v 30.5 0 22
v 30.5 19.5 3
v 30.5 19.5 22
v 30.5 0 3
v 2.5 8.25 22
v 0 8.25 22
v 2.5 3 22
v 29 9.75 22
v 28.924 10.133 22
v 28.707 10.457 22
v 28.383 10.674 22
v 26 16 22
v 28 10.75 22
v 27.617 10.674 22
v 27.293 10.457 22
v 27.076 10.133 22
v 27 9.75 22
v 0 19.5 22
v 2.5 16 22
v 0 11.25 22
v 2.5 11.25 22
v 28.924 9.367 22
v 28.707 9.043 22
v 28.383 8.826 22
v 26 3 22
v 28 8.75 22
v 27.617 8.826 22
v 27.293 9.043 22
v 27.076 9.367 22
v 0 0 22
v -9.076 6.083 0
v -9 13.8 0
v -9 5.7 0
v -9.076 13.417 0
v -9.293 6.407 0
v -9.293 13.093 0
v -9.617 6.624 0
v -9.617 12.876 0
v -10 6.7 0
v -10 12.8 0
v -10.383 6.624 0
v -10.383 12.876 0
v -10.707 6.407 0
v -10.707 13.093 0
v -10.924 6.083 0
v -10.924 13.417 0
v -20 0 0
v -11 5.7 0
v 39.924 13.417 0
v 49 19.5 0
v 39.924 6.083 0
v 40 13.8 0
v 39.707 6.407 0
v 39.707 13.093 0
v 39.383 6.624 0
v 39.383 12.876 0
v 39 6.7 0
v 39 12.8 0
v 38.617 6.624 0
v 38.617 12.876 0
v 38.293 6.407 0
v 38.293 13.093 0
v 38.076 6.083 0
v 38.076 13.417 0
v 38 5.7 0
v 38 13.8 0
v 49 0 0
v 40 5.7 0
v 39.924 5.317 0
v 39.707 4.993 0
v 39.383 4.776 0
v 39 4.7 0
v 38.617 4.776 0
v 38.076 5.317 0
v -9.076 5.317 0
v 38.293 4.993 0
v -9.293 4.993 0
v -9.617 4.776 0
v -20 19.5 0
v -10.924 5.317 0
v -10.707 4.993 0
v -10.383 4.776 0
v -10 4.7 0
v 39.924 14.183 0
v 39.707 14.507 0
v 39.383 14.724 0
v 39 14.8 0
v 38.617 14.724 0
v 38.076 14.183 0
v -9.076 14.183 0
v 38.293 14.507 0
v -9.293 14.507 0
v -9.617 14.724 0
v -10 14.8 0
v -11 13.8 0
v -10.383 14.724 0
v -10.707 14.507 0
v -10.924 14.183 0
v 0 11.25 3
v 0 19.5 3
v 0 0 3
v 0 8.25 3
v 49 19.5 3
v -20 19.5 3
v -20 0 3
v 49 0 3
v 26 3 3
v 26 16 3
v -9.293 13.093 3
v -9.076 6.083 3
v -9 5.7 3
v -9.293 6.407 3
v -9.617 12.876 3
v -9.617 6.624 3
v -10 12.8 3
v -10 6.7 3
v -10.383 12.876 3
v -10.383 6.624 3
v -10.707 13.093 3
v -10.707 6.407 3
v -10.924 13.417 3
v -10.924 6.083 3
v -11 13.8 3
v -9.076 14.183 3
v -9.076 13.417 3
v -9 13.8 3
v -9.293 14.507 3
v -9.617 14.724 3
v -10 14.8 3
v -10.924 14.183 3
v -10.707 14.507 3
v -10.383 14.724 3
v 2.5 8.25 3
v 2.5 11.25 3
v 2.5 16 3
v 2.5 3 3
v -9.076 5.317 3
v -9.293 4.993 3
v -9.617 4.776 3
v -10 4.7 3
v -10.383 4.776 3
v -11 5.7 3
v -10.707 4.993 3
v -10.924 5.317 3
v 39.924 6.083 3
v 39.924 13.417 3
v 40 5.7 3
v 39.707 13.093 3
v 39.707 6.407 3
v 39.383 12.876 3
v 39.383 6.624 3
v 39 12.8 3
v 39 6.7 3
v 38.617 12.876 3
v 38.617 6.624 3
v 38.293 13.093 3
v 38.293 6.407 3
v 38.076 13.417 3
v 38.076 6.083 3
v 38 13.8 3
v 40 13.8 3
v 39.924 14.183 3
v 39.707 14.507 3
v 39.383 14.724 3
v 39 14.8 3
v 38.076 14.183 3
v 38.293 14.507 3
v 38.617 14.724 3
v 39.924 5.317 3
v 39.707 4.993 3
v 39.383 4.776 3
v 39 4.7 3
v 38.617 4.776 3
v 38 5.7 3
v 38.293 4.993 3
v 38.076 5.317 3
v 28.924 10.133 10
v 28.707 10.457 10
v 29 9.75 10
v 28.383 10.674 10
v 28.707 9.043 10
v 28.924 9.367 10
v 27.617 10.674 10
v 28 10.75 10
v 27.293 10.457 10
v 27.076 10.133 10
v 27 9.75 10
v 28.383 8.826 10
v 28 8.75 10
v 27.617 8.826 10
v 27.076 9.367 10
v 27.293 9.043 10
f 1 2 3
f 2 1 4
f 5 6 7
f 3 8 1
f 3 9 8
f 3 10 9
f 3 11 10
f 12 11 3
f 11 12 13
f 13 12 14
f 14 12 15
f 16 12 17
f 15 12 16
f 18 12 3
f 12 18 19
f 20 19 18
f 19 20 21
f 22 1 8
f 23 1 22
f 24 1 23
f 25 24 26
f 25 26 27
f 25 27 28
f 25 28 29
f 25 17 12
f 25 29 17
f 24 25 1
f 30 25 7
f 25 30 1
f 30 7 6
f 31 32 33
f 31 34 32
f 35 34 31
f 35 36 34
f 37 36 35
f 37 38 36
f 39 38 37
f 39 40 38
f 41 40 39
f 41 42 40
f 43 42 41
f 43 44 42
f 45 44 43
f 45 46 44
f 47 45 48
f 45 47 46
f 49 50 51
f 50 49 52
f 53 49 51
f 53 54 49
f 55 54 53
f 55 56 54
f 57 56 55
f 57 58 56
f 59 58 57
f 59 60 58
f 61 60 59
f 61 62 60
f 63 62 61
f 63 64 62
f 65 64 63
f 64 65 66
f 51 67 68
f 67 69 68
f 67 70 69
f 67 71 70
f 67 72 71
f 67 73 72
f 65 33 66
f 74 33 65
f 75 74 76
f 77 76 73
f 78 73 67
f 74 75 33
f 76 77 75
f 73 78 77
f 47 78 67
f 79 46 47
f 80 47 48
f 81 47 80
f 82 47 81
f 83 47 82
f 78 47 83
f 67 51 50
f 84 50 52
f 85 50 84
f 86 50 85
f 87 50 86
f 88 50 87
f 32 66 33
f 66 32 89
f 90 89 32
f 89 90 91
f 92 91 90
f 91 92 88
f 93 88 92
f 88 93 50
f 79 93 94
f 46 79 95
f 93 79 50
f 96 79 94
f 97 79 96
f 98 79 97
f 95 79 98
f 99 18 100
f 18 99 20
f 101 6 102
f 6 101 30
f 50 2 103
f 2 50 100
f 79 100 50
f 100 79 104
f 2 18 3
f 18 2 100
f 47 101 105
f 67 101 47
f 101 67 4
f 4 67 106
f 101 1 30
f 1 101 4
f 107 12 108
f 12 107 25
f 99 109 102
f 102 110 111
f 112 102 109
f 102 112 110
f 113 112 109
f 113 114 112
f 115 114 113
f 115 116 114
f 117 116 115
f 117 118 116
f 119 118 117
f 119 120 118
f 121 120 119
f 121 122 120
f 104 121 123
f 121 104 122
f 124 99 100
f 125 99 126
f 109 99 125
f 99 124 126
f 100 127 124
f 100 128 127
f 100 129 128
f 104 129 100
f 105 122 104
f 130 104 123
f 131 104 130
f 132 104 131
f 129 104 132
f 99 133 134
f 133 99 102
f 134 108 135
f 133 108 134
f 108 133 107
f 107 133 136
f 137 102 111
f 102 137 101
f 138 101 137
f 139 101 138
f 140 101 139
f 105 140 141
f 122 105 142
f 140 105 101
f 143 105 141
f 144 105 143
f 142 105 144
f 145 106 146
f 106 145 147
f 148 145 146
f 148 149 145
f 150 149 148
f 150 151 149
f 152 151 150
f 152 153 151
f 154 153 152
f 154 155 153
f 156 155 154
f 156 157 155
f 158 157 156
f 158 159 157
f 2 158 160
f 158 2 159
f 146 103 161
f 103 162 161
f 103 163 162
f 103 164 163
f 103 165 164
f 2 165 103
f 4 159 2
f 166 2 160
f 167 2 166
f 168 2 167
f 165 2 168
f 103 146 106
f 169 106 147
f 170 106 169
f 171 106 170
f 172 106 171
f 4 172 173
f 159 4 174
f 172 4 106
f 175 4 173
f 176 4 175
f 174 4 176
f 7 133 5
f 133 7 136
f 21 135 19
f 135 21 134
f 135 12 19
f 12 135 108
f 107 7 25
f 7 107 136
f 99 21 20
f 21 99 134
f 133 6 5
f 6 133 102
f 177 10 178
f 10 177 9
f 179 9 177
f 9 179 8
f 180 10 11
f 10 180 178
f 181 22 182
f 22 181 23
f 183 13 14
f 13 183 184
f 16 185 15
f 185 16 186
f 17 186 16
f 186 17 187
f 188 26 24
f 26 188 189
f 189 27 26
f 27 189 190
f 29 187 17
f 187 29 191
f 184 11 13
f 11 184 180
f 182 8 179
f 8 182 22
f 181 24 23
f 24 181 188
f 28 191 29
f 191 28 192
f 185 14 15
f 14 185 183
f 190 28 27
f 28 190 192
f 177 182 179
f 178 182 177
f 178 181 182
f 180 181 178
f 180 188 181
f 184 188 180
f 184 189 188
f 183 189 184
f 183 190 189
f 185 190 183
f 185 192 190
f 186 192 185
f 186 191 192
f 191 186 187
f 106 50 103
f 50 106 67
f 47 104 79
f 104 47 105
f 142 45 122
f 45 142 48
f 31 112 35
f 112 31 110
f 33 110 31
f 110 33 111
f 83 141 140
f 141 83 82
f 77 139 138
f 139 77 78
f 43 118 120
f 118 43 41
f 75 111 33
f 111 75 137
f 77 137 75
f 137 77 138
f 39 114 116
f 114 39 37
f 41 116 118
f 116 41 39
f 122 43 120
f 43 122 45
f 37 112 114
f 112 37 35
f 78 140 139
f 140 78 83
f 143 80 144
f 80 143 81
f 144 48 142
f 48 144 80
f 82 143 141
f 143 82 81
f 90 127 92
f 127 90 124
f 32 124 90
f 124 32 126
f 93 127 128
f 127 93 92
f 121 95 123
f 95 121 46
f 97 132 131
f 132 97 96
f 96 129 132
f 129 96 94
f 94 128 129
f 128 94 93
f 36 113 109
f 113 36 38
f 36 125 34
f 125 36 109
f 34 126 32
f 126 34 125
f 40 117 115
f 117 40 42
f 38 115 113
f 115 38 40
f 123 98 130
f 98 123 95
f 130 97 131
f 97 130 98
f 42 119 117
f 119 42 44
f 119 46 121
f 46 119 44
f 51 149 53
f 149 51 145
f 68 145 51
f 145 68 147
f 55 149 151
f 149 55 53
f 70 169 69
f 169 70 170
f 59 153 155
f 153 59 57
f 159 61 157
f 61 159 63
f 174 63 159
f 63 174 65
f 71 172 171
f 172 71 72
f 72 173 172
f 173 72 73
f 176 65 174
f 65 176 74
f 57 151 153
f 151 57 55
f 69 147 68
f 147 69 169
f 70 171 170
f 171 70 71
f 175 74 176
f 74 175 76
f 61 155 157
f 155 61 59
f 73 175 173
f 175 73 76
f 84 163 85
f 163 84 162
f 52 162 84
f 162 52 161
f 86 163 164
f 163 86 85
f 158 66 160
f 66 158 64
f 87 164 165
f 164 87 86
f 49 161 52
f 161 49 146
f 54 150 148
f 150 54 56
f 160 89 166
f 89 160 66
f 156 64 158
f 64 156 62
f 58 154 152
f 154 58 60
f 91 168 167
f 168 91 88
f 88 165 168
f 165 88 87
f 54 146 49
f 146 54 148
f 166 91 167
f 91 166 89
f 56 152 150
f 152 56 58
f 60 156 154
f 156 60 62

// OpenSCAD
// Toucher

target = 2;
// 0 = inter motor
// 1 = finger 
// 2 = hand parm

// common
thick = 5;
thick2 = 3;

// for MG-90s
len = 23;
height = 12.5+1;
width = 19;

// inter-motor
inmot = 17 + 5;

// finger
flen = 100;
fdia = 8;
pendia = 10;
fixer = 6;

$fn = 16;

module InterMotor() {
    difference() {
        cube([ height+ thick, len+ thick*2, 10 ]);
        translate([ -1, thick, -1 ])
            cube([ height+1, len, 12 ]);
    }

    difference() {
        translate([ height,0,0 ])
            cube([ thick, len+ thick*2, 5+ inmot ]);
        translate([ height-1, 10, inmot ])
            rotate([ 0, 90, 0 ])
                cylinder( d=2, h=thick+2 );
    }

    translate([ 0, thick, 0 ])
        cylinder( d=2, h=10 );

    translate([ 0, thick+len, 0 ])
        cylinder( d=2, h=10 );
}

module FingerBody() {
    difference() {
        union() {
            cube([ thick, flen, fdia ]);
            translate([ thick/2, flen-(pendia+thick)/2-fixer, 0 ])
                cylinder( d=pendia+thick, h=fdia );
        }
        translate([ -1, 5, fdia/2 ])
            rotate([ 0, 90, 0 ])
                cylinder( d=2, h=thick+2 );
        translate([ -1, 5+8, fdia/2 ])
            rotate([ 0, 90, 0 ])
                cylinder( d=2, h=thick+2 );

        // pen fixer
        translate([ thick/2, flen-(pendia+thick)/2-fixer, 0 ])
            cylinder( d=pendia+1, h=fdia );
        translate([ -1, flen-fixer/2, fdia/2 ])
            rotate([ 0, 90, 0 ])
                cylinder( d=2, h=thick+2 );        
        translate([ thick/2-1, flen-thick-8, -1 ])
            cube([ 2, thick+9, fdia+2 ]);
    }
}

module HandParm() {
    difference() {
        cube([ len+thick2*2.5, height+thick2*2, width+thick2 ]);
        translate([ thick2-0.5, thick2, thick2 ])
            cube([ len+0.5, height-0.5, width+2 ]);
        translate([ -1, height/2+thick2/2, thick2 ])
            cube([ 10, thick2, width+1 ]);
        translate([ len+thick2*1.5+0.5, height/2+thick2, width-9 ])
            cylinder( d=2, h=20 );
    }
    difference() {
        translate([ -20, 0, 0 ])
            cube([ len+thick2*2+40, height+thick2*2, thick2 ]);
        translate([ -10, height*0.2+thick2, -1 ])
            cylinder( d=2, h=thick2+2 );
        translate([ -10, height*0.8+thick2, -1 ])
            cylinder( d=2, h=thick2+2 );
        translate([ len+thick2*2+10, height*0.2+thick2, -1 ])
            cylinder( d=2, h=thick2+2 );
        translate([ len+thick2*2+10, height*0.8+thick2, -1 ])
            cylinder( d=2, h=thick2+2 );
    }
}

if( target == 0 ) InterMotor();
if( target == 1 ) FingerBody();
if( target == 2 ) HandParm();
